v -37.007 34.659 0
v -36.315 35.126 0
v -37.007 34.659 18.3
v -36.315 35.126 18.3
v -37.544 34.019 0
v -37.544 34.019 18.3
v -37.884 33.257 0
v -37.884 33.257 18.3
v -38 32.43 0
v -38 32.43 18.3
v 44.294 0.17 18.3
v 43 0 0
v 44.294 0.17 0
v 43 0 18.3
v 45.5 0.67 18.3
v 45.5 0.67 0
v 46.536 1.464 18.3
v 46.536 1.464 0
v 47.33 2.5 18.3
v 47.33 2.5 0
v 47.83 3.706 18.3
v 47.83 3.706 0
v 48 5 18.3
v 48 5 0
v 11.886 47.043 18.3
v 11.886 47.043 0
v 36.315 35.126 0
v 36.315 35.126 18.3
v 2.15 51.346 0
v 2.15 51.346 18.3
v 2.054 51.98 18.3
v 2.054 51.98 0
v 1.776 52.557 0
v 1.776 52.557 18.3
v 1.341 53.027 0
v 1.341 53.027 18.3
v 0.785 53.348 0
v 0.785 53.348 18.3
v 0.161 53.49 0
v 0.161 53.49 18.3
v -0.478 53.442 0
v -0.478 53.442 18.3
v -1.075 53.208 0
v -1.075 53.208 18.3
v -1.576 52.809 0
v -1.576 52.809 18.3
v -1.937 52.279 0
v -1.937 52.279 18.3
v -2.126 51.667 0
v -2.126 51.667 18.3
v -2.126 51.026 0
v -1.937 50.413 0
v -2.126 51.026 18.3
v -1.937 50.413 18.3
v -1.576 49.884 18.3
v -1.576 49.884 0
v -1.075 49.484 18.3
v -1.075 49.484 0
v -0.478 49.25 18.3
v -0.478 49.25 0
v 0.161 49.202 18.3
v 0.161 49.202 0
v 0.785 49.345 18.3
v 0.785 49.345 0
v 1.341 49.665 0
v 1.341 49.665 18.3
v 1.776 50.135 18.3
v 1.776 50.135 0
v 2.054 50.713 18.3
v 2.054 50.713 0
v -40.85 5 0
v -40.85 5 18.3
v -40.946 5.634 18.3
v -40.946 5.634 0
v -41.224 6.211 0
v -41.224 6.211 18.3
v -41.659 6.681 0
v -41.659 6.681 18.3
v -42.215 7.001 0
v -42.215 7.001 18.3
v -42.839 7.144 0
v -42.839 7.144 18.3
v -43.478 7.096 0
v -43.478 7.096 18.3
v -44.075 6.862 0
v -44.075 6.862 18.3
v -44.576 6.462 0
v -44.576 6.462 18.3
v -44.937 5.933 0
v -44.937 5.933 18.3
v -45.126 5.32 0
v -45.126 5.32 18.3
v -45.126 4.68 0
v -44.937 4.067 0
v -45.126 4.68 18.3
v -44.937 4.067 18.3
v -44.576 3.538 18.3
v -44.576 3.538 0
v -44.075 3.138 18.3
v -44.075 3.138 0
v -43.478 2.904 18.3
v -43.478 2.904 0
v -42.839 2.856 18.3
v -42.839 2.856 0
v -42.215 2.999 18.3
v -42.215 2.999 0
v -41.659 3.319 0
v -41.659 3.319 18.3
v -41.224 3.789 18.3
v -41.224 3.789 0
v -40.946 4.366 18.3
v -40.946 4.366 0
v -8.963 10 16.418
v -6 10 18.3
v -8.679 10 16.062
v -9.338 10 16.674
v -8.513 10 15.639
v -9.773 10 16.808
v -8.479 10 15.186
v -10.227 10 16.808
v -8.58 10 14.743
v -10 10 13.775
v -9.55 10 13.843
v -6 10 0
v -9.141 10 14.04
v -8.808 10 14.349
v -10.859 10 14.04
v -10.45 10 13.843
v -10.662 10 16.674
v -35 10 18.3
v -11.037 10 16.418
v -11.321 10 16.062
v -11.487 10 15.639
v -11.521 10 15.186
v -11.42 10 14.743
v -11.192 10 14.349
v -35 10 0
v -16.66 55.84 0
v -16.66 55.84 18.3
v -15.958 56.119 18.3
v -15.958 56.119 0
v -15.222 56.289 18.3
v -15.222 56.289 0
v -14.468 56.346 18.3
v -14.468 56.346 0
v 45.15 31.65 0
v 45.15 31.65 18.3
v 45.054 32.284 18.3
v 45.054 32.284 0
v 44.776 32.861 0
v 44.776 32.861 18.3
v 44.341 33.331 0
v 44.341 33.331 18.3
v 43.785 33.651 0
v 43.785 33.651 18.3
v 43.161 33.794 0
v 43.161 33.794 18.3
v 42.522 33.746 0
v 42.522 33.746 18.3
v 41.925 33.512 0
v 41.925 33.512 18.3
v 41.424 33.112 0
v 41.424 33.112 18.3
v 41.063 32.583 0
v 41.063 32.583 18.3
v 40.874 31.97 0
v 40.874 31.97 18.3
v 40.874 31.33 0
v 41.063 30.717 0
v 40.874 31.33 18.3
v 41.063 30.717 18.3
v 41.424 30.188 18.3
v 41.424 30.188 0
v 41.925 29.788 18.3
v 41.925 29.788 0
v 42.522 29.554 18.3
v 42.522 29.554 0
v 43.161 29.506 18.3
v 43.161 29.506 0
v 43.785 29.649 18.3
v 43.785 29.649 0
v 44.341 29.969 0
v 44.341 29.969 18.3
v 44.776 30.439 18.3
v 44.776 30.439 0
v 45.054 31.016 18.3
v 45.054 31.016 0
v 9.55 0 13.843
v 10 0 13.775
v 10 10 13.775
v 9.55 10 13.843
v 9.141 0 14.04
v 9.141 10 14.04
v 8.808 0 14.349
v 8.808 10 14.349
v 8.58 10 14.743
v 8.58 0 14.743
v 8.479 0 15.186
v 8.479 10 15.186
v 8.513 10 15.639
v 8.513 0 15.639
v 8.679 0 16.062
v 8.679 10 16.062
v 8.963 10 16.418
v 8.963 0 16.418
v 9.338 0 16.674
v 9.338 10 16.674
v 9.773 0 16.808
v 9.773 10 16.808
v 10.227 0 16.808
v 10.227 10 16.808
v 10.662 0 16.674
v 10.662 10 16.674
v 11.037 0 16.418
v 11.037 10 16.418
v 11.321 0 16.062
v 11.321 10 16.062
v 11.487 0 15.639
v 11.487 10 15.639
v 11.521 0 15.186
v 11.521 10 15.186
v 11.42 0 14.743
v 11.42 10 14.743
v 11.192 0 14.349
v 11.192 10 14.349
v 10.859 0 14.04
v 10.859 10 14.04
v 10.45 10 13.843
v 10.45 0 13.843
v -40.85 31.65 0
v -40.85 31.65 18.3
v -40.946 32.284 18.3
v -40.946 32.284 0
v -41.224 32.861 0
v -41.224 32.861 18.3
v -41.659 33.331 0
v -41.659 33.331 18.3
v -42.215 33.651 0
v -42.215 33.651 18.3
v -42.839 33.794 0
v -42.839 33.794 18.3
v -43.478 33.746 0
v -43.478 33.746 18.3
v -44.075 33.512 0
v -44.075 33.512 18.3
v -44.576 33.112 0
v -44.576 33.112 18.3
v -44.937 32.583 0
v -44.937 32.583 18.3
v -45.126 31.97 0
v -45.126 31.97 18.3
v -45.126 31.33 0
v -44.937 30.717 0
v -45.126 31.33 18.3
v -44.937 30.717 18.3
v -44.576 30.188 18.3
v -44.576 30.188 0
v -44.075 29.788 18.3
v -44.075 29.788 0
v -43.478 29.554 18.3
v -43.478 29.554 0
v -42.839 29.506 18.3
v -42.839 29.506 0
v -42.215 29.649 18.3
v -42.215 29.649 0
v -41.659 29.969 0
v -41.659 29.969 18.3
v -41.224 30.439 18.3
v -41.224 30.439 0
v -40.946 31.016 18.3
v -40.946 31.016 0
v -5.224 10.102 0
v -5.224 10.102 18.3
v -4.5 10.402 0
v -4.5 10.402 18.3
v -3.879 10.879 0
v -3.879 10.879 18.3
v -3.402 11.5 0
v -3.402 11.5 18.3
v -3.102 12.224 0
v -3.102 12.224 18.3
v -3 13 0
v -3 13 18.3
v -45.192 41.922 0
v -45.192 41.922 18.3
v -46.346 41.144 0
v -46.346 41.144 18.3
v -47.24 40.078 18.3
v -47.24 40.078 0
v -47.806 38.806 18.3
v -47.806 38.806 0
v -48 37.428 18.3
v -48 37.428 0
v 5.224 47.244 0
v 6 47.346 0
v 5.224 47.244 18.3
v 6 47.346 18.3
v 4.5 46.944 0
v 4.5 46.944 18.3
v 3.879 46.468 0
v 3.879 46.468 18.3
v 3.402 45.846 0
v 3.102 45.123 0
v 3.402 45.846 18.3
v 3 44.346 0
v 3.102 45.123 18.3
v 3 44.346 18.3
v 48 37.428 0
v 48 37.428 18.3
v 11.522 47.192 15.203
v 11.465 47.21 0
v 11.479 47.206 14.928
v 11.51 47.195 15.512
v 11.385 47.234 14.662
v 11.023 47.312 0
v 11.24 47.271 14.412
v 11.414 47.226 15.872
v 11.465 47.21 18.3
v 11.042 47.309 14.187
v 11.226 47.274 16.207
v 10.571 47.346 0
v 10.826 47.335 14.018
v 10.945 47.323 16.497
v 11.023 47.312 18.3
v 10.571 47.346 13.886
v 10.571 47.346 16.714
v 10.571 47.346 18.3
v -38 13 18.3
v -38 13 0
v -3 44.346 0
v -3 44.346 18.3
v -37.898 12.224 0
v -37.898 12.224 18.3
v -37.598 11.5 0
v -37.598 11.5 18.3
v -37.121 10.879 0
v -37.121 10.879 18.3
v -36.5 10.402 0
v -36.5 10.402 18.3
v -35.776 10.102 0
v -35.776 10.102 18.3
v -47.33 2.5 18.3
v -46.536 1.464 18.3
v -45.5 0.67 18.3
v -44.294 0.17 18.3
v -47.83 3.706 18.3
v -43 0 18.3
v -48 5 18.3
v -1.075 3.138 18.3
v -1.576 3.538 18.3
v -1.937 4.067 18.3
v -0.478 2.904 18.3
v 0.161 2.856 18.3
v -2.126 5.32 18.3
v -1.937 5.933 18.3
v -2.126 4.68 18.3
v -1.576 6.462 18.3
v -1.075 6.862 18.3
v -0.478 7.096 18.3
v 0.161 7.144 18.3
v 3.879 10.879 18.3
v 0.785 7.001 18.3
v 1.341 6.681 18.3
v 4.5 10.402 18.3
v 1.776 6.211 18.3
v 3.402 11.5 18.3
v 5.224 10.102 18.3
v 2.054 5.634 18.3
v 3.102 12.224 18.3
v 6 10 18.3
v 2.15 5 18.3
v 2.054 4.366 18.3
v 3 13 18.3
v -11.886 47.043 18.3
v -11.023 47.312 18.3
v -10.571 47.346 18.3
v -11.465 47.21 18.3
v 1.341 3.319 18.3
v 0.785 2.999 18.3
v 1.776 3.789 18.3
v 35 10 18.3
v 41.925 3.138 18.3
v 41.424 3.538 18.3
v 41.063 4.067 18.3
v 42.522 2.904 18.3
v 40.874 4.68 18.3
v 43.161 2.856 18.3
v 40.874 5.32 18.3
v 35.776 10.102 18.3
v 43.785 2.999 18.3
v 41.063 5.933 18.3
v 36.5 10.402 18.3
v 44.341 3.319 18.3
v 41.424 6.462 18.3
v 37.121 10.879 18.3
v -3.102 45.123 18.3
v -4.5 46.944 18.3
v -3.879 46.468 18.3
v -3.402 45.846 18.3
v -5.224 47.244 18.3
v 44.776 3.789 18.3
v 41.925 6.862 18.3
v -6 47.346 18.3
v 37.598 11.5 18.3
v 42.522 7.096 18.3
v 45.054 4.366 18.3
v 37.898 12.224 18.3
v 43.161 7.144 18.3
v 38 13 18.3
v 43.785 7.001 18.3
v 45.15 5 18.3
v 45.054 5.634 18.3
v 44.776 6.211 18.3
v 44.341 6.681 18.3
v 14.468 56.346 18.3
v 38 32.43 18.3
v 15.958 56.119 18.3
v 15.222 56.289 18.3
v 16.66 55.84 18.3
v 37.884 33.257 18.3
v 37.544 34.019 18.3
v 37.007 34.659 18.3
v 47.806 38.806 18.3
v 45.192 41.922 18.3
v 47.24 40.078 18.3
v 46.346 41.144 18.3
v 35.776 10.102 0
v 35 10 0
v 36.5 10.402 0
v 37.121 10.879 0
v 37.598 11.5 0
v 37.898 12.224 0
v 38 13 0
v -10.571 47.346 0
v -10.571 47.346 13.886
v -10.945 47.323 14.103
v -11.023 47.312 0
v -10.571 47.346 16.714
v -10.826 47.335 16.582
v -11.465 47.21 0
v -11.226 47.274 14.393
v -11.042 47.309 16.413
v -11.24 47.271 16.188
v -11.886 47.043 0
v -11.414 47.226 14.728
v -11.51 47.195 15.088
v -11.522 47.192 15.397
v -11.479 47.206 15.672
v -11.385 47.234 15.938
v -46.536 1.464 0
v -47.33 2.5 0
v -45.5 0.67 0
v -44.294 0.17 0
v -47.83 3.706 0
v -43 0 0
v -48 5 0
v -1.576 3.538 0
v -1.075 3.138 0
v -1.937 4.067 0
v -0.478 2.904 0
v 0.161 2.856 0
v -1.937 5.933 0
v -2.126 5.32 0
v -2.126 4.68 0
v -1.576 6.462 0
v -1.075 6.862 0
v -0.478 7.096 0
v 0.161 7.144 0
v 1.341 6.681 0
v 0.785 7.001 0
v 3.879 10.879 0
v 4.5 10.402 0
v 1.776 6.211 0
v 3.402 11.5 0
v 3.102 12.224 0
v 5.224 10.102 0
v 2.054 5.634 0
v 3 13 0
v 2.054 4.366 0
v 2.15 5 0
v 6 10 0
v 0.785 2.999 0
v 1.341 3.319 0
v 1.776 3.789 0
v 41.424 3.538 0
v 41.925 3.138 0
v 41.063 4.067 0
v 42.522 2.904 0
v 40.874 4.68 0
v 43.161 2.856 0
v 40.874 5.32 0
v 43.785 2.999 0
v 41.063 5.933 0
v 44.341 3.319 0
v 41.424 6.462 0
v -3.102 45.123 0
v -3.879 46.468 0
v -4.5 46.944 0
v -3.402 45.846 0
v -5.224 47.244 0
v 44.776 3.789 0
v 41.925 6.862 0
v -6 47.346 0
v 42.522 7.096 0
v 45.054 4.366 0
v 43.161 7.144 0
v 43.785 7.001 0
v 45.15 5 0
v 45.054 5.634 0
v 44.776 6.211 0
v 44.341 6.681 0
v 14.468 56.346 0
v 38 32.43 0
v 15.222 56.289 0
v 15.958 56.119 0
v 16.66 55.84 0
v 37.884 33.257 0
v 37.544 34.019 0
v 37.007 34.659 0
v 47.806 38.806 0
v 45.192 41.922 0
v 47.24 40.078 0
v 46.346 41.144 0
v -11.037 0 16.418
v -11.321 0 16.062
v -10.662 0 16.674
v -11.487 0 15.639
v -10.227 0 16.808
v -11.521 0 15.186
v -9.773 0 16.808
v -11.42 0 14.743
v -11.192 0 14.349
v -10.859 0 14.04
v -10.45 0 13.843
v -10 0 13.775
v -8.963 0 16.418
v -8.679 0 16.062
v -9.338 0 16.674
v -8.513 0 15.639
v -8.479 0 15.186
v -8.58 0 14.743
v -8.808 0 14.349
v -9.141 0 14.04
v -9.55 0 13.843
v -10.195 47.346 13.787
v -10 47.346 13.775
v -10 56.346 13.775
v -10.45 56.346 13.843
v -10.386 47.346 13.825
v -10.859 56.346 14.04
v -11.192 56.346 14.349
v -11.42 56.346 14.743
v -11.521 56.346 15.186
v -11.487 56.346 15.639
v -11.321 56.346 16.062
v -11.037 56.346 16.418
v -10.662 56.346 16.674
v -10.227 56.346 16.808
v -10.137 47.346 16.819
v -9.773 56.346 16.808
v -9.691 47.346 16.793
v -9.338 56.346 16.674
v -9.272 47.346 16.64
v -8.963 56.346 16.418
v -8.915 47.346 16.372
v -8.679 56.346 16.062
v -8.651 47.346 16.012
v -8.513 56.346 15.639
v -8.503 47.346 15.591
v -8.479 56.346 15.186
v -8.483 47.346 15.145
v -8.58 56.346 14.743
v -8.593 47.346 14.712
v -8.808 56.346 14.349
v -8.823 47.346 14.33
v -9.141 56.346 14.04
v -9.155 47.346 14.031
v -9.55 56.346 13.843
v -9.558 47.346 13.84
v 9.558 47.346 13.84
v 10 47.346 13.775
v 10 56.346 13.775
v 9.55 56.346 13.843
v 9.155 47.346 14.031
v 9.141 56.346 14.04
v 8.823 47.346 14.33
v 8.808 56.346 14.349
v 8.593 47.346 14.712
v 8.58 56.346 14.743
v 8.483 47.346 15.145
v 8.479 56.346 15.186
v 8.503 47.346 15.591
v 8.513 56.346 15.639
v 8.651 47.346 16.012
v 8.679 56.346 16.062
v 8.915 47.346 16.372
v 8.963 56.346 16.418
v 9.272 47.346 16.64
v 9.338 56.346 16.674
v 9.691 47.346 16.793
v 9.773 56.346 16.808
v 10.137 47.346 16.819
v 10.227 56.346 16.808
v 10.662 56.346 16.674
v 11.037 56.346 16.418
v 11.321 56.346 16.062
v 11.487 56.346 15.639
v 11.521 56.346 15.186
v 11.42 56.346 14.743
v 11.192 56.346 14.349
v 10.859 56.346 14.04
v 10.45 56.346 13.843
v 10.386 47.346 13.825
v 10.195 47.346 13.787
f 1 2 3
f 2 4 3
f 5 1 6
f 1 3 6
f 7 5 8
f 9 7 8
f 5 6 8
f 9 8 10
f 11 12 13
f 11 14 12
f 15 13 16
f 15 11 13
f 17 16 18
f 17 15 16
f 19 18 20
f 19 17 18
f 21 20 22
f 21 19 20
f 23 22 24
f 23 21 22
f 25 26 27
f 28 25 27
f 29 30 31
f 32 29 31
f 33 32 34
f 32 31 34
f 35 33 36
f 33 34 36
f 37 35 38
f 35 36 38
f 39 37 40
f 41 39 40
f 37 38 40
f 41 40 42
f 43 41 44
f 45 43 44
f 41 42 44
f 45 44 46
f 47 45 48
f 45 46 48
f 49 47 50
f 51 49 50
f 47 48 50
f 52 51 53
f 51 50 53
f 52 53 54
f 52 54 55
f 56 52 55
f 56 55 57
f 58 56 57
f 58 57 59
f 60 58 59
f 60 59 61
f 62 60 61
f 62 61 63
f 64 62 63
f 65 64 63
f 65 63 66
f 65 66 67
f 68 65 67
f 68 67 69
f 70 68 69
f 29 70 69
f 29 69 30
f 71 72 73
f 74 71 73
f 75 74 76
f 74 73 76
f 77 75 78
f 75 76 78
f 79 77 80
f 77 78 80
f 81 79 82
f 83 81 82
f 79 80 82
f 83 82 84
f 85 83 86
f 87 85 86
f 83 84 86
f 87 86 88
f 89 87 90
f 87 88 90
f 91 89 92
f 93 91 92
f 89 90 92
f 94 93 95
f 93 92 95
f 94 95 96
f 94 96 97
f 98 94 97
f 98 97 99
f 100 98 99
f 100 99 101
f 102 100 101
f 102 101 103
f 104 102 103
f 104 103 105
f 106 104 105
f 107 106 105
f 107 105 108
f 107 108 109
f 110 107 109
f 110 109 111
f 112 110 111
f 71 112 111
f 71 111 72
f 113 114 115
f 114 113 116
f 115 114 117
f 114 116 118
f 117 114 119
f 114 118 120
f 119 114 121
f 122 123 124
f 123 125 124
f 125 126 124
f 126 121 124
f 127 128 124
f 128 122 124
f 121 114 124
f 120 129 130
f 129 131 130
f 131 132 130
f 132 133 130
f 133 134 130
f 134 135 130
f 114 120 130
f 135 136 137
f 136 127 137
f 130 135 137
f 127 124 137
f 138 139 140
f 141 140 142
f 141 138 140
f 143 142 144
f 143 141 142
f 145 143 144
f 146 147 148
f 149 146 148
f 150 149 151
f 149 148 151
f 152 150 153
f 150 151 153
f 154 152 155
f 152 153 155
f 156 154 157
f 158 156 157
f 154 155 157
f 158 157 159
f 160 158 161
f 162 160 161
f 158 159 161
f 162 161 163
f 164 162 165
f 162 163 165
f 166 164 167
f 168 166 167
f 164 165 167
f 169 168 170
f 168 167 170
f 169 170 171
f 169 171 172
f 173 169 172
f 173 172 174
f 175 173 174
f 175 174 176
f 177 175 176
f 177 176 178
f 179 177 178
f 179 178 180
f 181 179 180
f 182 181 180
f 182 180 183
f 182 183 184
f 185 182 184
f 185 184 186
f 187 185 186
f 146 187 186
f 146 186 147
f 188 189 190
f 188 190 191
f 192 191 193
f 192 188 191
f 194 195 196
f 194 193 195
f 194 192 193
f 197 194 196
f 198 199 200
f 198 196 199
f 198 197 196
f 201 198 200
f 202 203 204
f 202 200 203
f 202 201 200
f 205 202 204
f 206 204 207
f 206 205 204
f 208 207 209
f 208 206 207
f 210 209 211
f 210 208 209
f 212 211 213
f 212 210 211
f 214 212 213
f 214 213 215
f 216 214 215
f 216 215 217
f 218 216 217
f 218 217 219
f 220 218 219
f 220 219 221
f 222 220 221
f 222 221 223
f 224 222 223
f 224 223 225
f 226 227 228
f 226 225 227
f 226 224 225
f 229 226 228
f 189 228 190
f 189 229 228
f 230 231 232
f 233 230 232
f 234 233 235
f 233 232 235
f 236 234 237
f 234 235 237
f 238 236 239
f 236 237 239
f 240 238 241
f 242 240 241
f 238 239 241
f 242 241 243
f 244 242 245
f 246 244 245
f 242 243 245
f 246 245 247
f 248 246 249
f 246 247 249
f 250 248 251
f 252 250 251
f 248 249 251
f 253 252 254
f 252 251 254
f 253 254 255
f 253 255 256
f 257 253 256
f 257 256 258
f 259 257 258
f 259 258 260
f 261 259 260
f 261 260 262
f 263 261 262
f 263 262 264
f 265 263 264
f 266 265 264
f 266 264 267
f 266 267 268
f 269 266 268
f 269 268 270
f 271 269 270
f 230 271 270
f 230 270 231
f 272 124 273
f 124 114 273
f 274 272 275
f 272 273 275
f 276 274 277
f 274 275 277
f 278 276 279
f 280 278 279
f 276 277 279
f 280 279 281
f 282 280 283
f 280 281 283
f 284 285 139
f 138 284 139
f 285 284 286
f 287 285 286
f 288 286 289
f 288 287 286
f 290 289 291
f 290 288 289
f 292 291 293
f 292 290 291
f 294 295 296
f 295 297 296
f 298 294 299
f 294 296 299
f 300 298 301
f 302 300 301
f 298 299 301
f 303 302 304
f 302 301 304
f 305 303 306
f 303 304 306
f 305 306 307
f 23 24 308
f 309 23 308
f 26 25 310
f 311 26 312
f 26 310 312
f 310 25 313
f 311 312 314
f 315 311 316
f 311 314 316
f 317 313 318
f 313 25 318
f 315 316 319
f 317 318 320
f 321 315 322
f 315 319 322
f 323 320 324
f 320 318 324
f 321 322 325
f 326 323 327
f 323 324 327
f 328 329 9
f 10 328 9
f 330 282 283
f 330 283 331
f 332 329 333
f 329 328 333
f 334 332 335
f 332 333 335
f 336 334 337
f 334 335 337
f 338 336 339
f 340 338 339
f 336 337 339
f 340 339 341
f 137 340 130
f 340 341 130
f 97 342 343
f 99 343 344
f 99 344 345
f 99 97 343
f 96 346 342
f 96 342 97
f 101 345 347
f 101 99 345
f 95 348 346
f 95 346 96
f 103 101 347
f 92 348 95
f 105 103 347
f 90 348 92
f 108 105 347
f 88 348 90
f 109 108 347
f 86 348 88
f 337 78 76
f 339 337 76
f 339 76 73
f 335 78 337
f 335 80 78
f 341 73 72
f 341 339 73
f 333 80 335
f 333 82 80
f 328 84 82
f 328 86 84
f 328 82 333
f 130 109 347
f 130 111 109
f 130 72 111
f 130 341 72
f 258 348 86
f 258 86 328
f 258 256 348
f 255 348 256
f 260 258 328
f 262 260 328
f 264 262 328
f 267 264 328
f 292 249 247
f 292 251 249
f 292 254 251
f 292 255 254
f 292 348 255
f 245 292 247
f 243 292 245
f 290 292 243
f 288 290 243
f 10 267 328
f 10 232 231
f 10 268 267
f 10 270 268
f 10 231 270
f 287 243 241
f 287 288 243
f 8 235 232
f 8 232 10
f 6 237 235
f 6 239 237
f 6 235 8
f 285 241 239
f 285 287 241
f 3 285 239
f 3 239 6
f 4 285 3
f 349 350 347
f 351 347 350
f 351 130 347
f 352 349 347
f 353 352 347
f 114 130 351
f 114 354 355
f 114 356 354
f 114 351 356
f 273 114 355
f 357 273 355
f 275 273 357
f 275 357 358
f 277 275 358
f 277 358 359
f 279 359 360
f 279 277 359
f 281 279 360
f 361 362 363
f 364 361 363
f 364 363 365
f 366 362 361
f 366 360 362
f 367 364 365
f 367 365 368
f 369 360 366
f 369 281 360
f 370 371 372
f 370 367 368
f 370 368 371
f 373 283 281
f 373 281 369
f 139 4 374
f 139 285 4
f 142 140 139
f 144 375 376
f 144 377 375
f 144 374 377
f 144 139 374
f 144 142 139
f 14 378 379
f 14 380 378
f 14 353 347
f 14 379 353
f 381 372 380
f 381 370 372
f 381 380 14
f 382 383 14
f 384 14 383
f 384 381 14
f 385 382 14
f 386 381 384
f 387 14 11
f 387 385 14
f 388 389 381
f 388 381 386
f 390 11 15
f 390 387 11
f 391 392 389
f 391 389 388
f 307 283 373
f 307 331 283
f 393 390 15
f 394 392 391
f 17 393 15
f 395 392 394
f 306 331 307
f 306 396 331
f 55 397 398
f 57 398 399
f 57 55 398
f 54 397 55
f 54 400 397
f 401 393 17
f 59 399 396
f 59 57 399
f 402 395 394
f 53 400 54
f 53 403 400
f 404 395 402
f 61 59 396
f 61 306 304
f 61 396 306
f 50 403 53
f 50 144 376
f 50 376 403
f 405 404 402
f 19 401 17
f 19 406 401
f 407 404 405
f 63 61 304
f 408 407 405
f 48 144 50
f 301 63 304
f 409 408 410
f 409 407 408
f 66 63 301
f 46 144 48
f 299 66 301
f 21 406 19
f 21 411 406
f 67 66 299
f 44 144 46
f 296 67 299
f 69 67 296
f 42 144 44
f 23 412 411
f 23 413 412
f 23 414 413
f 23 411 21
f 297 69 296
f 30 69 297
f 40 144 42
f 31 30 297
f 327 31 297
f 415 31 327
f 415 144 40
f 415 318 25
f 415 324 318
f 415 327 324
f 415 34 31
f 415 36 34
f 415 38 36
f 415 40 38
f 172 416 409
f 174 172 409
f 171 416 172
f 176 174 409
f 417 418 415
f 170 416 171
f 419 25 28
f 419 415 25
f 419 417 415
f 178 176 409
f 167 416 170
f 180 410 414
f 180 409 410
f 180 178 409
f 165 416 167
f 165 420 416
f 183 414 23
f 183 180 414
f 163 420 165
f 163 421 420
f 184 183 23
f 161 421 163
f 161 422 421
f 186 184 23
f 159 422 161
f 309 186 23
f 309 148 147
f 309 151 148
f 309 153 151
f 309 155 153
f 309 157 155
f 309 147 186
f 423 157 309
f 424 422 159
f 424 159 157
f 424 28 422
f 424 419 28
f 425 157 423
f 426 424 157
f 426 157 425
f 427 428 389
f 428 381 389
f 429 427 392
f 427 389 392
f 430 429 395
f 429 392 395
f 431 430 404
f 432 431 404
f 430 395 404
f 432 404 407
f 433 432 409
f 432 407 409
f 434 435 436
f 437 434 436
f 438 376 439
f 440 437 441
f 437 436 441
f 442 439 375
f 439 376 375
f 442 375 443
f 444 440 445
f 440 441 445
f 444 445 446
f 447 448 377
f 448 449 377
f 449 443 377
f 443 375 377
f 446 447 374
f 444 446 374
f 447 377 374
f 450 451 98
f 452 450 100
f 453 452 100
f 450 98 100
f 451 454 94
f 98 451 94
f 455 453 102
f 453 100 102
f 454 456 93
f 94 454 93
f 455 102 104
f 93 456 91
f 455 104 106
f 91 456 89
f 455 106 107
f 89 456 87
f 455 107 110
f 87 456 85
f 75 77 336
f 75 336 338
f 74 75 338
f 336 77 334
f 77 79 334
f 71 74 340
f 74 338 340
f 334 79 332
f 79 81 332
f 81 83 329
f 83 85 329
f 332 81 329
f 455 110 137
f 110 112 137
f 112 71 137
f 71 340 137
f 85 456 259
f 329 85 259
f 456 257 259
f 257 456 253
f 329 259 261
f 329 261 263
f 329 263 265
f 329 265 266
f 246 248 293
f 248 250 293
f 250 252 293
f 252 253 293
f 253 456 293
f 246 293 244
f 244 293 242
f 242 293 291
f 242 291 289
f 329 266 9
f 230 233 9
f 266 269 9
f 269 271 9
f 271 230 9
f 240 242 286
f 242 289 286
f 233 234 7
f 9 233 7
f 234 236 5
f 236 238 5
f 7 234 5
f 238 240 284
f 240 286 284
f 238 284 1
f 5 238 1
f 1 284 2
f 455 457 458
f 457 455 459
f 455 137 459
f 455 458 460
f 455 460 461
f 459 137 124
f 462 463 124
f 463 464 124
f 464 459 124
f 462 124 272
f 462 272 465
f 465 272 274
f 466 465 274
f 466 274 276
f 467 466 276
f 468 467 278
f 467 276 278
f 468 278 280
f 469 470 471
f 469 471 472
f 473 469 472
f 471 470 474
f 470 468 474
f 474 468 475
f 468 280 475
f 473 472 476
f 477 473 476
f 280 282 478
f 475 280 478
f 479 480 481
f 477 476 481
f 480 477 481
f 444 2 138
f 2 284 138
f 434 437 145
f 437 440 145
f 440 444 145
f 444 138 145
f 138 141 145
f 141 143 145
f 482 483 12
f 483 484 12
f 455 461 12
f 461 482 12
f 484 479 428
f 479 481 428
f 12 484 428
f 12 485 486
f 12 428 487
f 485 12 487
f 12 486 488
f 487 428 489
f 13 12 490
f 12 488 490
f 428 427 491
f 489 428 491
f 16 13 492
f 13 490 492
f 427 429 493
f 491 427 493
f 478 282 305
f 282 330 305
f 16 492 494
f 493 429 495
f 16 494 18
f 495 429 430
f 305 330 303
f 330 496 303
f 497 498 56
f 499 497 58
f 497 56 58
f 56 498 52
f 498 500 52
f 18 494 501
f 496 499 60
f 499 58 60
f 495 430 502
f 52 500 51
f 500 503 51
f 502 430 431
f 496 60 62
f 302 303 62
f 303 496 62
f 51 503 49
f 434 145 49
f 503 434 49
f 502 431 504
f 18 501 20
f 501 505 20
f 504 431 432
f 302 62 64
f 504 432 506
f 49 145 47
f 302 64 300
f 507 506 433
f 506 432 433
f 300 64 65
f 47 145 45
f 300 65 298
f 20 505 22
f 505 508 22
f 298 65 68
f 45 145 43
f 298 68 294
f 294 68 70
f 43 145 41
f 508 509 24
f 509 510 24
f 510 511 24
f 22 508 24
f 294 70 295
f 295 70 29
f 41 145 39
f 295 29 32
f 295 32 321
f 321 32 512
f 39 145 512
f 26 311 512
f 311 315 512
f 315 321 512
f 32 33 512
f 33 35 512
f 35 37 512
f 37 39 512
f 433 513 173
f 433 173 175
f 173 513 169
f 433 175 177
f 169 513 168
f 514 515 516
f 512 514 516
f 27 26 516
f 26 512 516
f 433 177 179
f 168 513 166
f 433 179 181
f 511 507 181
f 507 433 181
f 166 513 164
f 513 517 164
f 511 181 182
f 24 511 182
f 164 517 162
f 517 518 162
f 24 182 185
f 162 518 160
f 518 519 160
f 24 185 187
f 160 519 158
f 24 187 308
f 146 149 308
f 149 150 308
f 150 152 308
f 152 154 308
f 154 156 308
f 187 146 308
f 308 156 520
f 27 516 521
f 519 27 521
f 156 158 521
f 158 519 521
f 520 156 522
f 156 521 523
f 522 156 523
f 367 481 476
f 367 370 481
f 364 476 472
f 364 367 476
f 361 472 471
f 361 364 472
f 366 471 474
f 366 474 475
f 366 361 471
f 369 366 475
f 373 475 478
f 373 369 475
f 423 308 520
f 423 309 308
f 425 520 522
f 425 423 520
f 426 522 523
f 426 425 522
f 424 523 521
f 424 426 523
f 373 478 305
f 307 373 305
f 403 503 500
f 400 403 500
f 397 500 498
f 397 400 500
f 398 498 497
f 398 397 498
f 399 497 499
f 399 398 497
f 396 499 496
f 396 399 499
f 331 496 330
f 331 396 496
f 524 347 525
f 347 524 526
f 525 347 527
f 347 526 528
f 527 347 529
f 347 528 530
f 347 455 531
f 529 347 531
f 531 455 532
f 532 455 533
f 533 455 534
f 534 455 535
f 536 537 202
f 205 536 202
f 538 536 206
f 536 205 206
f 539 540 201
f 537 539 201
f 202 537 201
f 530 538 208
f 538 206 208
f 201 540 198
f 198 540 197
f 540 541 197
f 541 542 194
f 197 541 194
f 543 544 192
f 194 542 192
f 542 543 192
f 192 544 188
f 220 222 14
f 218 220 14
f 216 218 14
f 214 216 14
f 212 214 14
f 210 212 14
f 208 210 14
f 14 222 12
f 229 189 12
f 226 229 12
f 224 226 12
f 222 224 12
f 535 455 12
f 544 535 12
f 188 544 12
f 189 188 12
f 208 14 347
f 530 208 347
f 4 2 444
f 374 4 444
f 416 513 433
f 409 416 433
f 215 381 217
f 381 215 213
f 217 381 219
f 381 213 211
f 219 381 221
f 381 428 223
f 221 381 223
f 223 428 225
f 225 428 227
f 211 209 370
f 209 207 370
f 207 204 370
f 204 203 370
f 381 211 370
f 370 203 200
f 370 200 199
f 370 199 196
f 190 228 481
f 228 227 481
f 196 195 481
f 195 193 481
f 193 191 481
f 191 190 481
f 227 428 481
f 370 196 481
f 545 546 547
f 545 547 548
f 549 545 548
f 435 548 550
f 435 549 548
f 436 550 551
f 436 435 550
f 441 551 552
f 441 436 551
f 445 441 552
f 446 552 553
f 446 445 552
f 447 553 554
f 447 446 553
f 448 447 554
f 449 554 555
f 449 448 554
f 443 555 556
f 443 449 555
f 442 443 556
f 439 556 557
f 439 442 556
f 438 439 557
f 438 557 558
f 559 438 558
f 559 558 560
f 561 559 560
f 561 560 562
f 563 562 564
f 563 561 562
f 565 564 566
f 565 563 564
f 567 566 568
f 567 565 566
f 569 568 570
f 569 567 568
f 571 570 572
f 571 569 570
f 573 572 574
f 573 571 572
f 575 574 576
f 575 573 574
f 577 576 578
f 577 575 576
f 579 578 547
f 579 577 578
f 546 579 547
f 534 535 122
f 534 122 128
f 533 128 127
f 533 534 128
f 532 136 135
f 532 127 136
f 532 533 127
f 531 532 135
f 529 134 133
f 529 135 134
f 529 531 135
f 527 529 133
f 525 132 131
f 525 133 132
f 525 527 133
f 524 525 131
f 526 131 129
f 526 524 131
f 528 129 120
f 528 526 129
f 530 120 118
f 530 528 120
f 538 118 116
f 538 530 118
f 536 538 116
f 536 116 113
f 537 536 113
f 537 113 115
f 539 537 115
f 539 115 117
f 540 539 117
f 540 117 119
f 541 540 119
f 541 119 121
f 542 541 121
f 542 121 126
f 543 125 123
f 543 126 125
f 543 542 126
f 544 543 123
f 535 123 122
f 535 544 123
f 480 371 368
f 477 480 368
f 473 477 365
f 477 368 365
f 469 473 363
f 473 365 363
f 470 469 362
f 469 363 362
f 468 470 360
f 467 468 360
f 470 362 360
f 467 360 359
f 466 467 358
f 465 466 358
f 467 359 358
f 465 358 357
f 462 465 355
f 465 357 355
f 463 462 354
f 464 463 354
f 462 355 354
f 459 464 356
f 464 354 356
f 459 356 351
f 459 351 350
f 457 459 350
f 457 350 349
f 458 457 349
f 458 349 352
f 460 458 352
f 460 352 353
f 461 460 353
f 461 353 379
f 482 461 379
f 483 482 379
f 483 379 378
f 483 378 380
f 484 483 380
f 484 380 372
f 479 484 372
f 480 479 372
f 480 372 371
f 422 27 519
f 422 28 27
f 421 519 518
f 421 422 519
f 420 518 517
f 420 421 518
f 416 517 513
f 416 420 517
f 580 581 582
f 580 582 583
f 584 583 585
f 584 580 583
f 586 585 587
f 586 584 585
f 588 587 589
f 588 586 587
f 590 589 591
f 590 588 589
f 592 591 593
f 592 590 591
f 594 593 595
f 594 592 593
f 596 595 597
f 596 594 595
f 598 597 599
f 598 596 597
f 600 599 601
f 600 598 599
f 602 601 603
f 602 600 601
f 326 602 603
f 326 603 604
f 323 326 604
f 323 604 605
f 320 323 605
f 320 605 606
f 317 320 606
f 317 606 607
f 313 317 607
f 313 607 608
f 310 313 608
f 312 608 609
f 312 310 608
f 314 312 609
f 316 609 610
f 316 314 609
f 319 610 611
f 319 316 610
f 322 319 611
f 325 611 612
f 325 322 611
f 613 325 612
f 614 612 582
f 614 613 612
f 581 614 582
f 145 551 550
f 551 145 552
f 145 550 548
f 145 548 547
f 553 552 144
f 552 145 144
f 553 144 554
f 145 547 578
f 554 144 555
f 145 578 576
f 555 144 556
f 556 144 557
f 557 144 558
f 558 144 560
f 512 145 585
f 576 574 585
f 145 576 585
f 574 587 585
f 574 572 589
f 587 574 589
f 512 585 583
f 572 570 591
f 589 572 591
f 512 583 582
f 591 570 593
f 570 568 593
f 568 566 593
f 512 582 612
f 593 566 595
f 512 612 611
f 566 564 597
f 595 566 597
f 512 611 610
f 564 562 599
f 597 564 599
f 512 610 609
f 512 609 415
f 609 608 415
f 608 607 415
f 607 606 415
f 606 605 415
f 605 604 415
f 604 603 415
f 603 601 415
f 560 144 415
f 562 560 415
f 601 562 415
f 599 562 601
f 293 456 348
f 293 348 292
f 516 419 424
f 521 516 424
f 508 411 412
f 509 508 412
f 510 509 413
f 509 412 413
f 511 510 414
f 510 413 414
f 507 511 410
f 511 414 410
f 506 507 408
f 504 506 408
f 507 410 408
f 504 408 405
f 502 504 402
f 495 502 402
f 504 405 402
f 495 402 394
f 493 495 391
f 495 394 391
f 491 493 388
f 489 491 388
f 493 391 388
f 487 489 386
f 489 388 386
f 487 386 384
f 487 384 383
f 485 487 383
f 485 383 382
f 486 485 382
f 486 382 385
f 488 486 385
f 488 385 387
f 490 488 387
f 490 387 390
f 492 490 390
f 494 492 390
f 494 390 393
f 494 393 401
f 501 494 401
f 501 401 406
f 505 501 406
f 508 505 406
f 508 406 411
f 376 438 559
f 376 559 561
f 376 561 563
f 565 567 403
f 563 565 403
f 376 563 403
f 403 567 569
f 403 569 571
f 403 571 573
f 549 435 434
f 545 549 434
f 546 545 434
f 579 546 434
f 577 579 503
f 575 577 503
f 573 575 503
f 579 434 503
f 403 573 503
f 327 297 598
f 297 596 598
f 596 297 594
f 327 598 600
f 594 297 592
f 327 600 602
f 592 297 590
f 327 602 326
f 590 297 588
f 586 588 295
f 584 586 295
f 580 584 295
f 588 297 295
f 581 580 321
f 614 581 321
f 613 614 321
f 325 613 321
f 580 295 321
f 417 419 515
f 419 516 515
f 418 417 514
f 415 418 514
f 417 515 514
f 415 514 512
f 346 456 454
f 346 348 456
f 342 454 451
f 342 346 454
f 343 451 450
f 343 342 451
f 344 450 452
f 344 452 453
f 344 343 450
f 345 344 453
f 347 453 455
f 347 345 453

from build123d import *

# Parameters (mm, degrees)
SKETCH_1_R               = 6
EXTRUDE_1_DEPTH          = 18.3
CUT_EXTRUDE_1_DEPTH      = 38
SKETCH_3_R               = 2.15
CUT_EXTRUDE_2_DEPTH      = 74
CUT_EXTRUDE_START        = -74
SKETCH_5_W               = 10
SKETCH_5_H               = 40.552439024
CUT_EXTRUDE_3_DEPTH      = 156.521752466
CUT_EXTRUDE_4_DEPTH      = 40
SKETCH_8_W               = 6
SKETCH_8_H               = 37.346305337
EXTRUDE_2_DEPTH          = 18.3
FILLET_2_R               = 3
FILLET_3_R               = 5
CUT_EXTRUDE_7_DEPTH      = 80
CUT_EXTRUDE_7_DEPTH_BACK = 40
SKETCH_12_R              = 1.525


with BuildPart() as part:
    # 草图1 → 凸台-拉伸1 (new body)
    with BuildSketch(Plane.XY):
        with BuildLine():
            Line((-8.281928864, 111.239451243), (-56, 56.65))
            Line((-56, 56.65), (-56, 0))
            Line((-56, 0), (56, 0))
            Line((56, 0), (56, 56.65))
            Line((56, 56.65), (8.281928864, 111.239451243))
            ThreePointArc((8.281928864, 111.239451243), (0, 115), (-8.281928864, 111.239451243))
        make_face()
        with Locations((0, 104)):
            Circle(SKETCH_1_R, mode=Mode.SUBTRACT)
    extrude(amount=EXTRUDE_1_DEPTH)

    # 草图2 → Cut-Extrude 1 (cut)
    with BuildSketch(Plane.XY.offset(18.3)):
        Polygon((15.622574059, 56.346305337), (56, 36.65), (56, 56.65), (30, 116.346305337), (-30, 116.346305337), (-56, 56.65), (-56, 36.65), (-15.622574059, 56.346305337), align=None)
    extrude(amount=-CUT_EXTRUDE_1_DEPTH, mode=Mode.SUBTRACT)

    # 草图3 → 切除-拉伸2 (cut)
    with BuildSketch(Plane.XY.offset(18.3)):
        with Locations((0, 51.346305337)):
            Circle(SKETCH_3_R)
        with Locations((43, 31.65)):
            Circle(SKETCH_3_R)
        with Locations((43, 5)):
            Circle(SKETCH_3_R)
        with Locations((-43, 5)):
            Circle(SKETCH_3_R)
        with Locations((-43, 31.65)):
            Circle(SKETCH_3_R)
        with Locations((0, 5)):
            Circle(SKETCH_3_R)
    extrude(amount=-CUT_EXTRUDE_2_DEPTH, mode=Mode.SUBTRACT)

    # 草图5 → Cut-Extrude 3 (cut)
    with BuildSketch(Plane.XY.offset(18.3).offset(CUT_EXTRUDE_START)):
        with Locations((53, 20.276219512)):
            Rectangle(SKETCH_5_W, SKETCH_5_H)
    cut_extrude_3 = extrude(amount=CUT_EXTRUDE_3_DEPTH, mode=Mode.SUBTRACT)

    # 镜向2: Cut-Extrude 3 across plane
    add(cut_extrude_3.mirror(Plane(origin=(0, 0, 0), x_dir=(0, 0, 1), z_dir=(1, 0, 0))), mode=Mode.SUBTRACT)

    # 草图7 → 切除-拉伸4 (cut)
    with BuildSketch(Plane(origin=(0, 0, 0), x_dir=(-1, 0, 0), z_dir=(0, 0, -1))):
        Polygon((-38, 34.304151485), (-38, 10), (38, 10), (38, 34.304151485), (11.263584603, 47.346305337), (-11.263584603, 47.346305337), align=None)
    extrude(amount=-CUT_EXTRUDE_4_DEPTH, mode=Mode.SUBTRACT)

    # 草图8 → 凸台-拉伸2 (add)
    with BuildSketch(Plane(origin=(0, 0, 0), x_dir=(-1, 0, 0), z_dir=(0, 0, -1))):
        with Locations((0, 28.673152669)):
            Rectangle(SKETCH_8_W, SKETCH_8_H)
    extrude(amount=-EXTRUDE_2_DEPTH)

    # 圆角2
    fillet_2_edges = [part.edges().sort_by_distance(p)[0] for p in [
        (38, 34.304151485, 9.15),
        (11.263584603, 47.346305337, 9.15),
        (-11.263584603, 47.346305337, 9.15),
        (-38, 34.304151485, 9.15),
        (-38, 10, 9.15),
        (38, 10, 9.15),
        (3, 10, 9.15),
        (-3, 10, 9.15),
        (-3, 47.346305337, 9.15),
        (3, 47.346305337, 9.15),
    ]]
    fillet(fillet_2_edges, radius=FILLET_2_R)

    # 圆角3
    fillet_3_edges = [part.edges().sort_by_distance(p)[0] for p in [
        (-48, 40.552439024, 9.15),
        (-48, 0, 9.15),
        (15.622574059, 56.346305337, 9.15),
        (-15.622574059, 56.346305337, 9.15),
        (48, 40.552439024, 9.15),
        (48, 0, 9.15),
    ]]
    fillet(fillet_3_edges, radius=FILLET_3_R)

    # 草图12 → 切除-拉伸7 (cut, two sides: drawn at the far end of the back side and taken through both)
    with BuildSketch(Plane(origin=(0, 10, 0), x_dir=(1, 0, 0), z_dir=(0, 1, 0)).offset(-CUT_EXTRUDE_7_DEPTH_BACK)):
        with Locations(Location((-10, -15.3, 0), (0, 0, 90))):
            Circle(SKETCH_12_R)
        with Locations(Location((10, -15.3, 0), (0, 0, 90))):
            Circle(SKETCH_12_R)
    extrude(amount=CUT_EXTRUDE_7_DEPTH + CUT_EXTRUDE_7_DEPTH_BACK, mode=Mode.SUBTRACT)


solid = part.part
